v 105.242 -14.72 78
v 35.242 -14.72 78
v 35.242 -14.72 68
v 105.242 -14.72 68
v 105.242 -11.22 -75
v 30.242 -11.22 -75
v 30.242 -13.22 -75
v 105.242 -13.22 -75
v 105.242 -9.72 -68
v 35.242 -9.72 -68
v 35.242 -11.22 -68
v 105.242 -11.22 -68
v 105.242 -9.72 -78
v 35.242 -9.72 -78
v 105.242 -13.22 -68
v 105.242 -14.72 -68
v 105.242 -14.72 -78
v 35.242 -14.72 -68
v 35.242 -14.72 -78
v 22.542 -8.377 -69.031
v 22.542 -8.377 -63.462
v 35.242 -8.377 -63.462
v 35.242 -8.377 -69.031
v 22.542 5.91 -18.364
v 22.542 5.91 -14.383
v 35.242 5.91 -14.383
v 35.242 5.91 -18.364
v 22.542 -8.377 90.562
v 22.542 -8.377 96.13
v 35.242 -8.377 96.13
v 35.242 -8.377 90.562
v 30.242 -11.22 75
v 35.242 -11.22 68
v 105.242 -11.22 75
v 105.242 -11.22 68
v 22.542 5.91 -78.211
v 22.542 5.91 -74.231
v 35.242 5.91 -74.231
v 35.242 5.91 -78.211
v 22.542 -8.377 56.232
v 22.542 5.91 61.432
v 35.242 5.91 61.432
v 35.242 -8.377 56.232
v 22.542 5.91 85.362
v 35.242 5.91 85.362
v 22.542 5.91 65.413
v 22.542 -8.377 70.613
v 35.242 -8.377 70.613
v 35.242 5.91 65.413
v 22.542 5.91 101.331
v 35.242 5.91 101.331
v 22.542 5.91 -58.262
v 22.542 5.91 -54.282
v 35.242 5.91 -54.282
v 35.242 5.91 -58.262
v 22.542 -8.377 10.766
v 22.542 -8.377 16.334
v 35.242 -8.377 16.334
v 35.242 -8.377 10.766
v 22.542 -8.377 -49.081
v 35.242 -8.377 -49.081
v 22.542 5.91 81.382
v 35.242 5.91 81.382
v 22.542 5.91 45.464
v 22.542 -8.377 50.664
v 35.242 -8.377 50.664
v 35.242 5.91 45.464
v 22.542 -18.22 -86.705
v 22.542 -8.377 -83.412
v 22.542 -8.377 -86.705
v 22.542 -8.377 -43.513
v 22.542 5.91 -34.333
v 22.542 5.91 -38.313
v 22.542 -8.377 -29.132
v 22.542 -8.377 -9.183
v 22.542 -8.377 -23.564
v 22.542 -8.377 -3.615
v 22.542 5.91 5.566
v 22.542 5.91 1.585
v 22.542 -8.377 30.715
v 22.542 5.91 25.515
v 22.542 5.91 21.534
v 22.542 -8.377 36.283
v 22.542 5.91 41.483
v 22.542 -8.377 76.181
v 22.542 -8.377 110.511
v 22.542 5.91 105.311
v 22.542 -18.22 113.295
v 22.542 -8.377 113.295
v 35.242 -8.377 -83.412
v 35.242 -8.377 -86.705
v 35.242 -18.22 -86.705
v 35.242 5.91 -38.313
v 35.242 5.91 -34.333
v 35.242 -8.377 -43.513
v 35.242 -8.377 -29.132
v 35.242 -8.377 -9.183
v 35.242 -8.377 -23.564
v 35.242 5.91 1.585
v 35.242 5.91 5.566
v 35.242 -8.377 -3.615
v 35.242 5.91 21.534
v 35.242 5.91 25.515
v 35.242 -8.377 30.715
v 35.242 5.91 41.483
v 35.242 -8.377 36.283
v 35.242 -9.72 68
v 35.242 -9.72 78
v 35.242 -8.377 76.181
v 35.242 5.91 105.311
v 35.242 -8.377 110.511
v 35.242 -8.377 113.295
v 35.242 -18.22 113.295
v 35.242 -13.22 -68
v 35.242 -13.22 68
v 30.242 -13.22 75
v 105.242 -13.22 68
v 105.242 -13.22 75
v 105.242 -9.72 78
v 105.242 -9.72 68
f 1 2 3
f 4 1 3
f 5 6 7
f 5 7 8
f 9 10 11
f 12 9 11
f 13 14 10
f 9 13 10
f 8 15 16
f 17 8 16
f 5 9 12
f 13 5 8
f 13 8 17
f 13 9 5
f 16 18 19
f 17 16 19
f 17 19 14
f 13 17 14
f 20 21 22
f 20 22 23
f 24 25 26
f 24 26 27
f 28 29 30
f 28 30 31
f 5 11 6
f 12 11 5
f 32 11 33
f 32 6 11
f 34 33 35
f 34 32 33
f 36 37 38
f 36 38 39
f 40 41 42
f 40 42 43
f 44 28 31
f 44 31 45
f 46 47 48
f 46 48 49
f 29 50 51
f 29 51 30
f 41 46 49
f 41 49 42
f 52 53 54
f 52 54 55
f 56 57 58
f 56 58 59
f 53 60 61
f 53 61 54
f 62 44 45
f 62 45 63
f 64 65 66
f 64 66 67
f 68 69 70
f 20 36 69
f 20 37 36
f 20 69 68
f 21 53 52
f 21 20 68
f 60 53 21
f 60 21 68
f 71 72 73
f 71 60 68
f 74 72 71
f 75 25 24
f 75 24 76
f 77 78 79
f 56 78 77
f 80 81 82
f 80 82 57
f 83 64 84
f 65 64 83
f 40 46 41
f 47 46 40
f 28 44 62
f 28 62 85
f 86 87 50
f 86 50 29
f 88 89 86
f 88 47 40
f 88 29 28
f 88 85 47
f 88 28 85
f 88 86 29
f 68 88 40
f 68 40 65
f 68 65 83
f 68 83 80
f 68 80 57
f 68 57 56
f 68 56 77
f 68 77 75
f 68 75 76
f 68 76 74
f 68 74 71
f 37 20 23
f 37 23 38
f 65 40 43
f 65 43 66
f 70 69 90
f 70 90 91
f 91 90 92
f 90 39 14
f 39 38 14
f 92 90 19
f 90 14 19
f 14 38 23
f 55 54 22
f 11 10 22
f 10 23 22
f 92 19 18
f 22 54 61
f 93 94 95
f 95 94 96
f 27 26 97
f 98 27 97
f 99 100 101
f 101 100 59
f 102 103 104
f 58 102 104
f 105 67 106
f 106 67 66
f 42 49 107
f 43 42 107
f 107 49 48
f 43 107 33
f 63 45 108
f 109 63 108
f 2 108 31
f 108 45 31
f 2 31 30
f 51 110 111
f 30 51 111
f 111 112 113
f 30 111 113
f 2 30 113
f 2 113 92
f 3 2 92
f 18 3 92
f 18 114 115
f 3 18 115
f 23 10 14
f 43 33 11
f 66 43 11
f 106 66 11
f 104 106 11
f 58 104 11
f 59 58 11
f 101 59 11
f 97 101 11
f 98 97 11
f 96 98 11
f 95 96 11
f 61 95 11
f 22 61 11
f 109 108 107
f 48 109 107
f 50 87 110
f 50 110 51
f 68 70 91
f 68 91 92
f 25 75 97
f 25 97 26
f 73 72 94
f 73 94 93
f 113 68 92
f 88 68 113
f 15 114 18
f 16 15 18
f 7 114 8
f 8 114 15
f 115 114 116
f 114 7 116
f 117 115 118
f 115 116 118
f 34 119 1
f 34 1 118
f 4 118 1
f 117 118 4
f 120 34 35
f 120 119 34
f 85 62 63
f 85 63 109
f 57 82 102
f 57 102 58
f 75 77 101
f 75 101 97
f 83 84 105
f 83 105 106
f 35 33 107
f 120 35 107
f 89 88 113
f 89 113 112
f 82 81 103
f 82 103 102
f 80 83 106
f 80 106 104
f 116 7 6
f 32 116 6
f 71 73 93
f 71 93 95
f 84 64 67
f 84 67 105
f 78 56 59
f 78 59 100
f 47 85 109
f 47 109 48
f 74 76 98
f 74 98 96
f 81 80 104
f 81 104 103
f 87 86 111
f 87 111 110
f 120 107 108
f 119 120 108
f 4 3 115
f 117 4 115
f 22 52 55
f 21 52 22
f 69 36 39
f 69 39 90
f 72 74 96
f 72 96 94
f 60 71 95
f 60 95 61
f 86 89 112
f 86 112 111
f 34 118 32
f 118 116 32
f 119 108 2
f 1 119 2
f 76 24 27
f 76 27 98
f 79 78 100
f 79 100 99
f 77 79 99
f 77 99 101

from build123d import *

# Parameters (mm, degrees)
BOSS_EXTRUDE1_DEPTH = 12.7
SKETCH3_W           = 5
SKETCH3_H           = 2
CUT_EXTRUDE1_DEPTH  = 75
BOSS_EXTRUDE3_DEPTH = 70


with BuildPart() as part:
    # Sketch1 → Boss-Extrude1 (new body)
    with BuildSketch(Plane(origin=(22.542150286, 0, 0), x_dir=(0, -1, 0), z_dir=(-1, 0, 0))):
        Polygon((-5.910199341, -78.211363822), (8.377300659, -83.411588544), (8.377300659, -86.704627867), (18.219800659, -86.704627867), (18.219800659, 113.295480133), (8.377300659, 113.295480133), (8.377300659, 110.511415536), (-5.910199341, 105.311190814), (-5.910199341, 101.330656125), (8.377300659, 96.130431403), (8.377300659, 90.562302208), (-5.910199341, 85.362077486), (-5.910199341, 81.381542798), (8.377300659, 76.181318076), (8.377300659, 70.613188881), (-5.910199341, 65.412964159), (-5.910199341, 61.43242947), (8.377300659, 56.232204748), (8.377300659, 50.664075553), (-5.910199341, 45.463850831), (-5.910199341, 41.483316143), (8.377300659, 36.283091421), (8.377300659, 30.714962226), (-5.910199341, 25.514737504), (-5.910199341, 21.534202815), (8.377300659, 16.333978093), (8.377300659, 10.765848898), (-5.910199341, 5.565624176), (-5.910199341, 1.585089488), (8.377300659, -3.615135234), (8.377300659, -9.183264429), (-5.910199341, -14.383489151), (-5.910199341, -18.36402384), (8.377300659, -23.564248562), (8.377300659, -29.132377757), (-5.910199341, -34.332602479), (-5.910199341, -38.313137167), (8.377300659, -43.513361889), (8.377300659, -49.081491084), (-5.910199341, -54.281715806), (-5.910199341, -58.262250495), (8.377300659, -63.462475217), (8.377300659, -69.030604412), (-5.910199341, -74.230829134), align=None)
    extrude(amount=-BOSS_EXTRUDE1_DEPTH)

    # Sketch3 → Cut-Extrude1 (cut, symmetric)
    with BuildSketch(Plane.XY):
        with Locations((32.742150286, -12.219800659)):
            Rectangle(SKETCH3_W, SKETCH3_H)
    extrude(amount=CUT_EXTRUDE1_DEPTH, both=True, mode=Mode.SUBTRACT)

    # Sketch4 → Boss-Extrude3 (add)
    with BuildSketch(Plane(origin=(35.242150286, 0, 0), x_dir=(0, 0, -1), z_dir=(1, 0, 0))):
        Polygon((-78, -9.719800659), (-78, -14.719800659), (-68, -14.719800659), (-68, -13.219800659), (-75, -13.219800659), (-75, -11.219800659), (-68, -11.219800659), (-68, -9.719800659), align=None)
        Polygon((68, -14.719800659), (78, -14.719800659), (78, -9.719800659), (68, -9.719800659), (68, -11.219800659), (75, -11.219800659), (75, -13.219800659), (68, -13.219800659), align=None)
    extrude(amount=BOSS_EXTRUDE3_DEPTH)


solid = part.part
